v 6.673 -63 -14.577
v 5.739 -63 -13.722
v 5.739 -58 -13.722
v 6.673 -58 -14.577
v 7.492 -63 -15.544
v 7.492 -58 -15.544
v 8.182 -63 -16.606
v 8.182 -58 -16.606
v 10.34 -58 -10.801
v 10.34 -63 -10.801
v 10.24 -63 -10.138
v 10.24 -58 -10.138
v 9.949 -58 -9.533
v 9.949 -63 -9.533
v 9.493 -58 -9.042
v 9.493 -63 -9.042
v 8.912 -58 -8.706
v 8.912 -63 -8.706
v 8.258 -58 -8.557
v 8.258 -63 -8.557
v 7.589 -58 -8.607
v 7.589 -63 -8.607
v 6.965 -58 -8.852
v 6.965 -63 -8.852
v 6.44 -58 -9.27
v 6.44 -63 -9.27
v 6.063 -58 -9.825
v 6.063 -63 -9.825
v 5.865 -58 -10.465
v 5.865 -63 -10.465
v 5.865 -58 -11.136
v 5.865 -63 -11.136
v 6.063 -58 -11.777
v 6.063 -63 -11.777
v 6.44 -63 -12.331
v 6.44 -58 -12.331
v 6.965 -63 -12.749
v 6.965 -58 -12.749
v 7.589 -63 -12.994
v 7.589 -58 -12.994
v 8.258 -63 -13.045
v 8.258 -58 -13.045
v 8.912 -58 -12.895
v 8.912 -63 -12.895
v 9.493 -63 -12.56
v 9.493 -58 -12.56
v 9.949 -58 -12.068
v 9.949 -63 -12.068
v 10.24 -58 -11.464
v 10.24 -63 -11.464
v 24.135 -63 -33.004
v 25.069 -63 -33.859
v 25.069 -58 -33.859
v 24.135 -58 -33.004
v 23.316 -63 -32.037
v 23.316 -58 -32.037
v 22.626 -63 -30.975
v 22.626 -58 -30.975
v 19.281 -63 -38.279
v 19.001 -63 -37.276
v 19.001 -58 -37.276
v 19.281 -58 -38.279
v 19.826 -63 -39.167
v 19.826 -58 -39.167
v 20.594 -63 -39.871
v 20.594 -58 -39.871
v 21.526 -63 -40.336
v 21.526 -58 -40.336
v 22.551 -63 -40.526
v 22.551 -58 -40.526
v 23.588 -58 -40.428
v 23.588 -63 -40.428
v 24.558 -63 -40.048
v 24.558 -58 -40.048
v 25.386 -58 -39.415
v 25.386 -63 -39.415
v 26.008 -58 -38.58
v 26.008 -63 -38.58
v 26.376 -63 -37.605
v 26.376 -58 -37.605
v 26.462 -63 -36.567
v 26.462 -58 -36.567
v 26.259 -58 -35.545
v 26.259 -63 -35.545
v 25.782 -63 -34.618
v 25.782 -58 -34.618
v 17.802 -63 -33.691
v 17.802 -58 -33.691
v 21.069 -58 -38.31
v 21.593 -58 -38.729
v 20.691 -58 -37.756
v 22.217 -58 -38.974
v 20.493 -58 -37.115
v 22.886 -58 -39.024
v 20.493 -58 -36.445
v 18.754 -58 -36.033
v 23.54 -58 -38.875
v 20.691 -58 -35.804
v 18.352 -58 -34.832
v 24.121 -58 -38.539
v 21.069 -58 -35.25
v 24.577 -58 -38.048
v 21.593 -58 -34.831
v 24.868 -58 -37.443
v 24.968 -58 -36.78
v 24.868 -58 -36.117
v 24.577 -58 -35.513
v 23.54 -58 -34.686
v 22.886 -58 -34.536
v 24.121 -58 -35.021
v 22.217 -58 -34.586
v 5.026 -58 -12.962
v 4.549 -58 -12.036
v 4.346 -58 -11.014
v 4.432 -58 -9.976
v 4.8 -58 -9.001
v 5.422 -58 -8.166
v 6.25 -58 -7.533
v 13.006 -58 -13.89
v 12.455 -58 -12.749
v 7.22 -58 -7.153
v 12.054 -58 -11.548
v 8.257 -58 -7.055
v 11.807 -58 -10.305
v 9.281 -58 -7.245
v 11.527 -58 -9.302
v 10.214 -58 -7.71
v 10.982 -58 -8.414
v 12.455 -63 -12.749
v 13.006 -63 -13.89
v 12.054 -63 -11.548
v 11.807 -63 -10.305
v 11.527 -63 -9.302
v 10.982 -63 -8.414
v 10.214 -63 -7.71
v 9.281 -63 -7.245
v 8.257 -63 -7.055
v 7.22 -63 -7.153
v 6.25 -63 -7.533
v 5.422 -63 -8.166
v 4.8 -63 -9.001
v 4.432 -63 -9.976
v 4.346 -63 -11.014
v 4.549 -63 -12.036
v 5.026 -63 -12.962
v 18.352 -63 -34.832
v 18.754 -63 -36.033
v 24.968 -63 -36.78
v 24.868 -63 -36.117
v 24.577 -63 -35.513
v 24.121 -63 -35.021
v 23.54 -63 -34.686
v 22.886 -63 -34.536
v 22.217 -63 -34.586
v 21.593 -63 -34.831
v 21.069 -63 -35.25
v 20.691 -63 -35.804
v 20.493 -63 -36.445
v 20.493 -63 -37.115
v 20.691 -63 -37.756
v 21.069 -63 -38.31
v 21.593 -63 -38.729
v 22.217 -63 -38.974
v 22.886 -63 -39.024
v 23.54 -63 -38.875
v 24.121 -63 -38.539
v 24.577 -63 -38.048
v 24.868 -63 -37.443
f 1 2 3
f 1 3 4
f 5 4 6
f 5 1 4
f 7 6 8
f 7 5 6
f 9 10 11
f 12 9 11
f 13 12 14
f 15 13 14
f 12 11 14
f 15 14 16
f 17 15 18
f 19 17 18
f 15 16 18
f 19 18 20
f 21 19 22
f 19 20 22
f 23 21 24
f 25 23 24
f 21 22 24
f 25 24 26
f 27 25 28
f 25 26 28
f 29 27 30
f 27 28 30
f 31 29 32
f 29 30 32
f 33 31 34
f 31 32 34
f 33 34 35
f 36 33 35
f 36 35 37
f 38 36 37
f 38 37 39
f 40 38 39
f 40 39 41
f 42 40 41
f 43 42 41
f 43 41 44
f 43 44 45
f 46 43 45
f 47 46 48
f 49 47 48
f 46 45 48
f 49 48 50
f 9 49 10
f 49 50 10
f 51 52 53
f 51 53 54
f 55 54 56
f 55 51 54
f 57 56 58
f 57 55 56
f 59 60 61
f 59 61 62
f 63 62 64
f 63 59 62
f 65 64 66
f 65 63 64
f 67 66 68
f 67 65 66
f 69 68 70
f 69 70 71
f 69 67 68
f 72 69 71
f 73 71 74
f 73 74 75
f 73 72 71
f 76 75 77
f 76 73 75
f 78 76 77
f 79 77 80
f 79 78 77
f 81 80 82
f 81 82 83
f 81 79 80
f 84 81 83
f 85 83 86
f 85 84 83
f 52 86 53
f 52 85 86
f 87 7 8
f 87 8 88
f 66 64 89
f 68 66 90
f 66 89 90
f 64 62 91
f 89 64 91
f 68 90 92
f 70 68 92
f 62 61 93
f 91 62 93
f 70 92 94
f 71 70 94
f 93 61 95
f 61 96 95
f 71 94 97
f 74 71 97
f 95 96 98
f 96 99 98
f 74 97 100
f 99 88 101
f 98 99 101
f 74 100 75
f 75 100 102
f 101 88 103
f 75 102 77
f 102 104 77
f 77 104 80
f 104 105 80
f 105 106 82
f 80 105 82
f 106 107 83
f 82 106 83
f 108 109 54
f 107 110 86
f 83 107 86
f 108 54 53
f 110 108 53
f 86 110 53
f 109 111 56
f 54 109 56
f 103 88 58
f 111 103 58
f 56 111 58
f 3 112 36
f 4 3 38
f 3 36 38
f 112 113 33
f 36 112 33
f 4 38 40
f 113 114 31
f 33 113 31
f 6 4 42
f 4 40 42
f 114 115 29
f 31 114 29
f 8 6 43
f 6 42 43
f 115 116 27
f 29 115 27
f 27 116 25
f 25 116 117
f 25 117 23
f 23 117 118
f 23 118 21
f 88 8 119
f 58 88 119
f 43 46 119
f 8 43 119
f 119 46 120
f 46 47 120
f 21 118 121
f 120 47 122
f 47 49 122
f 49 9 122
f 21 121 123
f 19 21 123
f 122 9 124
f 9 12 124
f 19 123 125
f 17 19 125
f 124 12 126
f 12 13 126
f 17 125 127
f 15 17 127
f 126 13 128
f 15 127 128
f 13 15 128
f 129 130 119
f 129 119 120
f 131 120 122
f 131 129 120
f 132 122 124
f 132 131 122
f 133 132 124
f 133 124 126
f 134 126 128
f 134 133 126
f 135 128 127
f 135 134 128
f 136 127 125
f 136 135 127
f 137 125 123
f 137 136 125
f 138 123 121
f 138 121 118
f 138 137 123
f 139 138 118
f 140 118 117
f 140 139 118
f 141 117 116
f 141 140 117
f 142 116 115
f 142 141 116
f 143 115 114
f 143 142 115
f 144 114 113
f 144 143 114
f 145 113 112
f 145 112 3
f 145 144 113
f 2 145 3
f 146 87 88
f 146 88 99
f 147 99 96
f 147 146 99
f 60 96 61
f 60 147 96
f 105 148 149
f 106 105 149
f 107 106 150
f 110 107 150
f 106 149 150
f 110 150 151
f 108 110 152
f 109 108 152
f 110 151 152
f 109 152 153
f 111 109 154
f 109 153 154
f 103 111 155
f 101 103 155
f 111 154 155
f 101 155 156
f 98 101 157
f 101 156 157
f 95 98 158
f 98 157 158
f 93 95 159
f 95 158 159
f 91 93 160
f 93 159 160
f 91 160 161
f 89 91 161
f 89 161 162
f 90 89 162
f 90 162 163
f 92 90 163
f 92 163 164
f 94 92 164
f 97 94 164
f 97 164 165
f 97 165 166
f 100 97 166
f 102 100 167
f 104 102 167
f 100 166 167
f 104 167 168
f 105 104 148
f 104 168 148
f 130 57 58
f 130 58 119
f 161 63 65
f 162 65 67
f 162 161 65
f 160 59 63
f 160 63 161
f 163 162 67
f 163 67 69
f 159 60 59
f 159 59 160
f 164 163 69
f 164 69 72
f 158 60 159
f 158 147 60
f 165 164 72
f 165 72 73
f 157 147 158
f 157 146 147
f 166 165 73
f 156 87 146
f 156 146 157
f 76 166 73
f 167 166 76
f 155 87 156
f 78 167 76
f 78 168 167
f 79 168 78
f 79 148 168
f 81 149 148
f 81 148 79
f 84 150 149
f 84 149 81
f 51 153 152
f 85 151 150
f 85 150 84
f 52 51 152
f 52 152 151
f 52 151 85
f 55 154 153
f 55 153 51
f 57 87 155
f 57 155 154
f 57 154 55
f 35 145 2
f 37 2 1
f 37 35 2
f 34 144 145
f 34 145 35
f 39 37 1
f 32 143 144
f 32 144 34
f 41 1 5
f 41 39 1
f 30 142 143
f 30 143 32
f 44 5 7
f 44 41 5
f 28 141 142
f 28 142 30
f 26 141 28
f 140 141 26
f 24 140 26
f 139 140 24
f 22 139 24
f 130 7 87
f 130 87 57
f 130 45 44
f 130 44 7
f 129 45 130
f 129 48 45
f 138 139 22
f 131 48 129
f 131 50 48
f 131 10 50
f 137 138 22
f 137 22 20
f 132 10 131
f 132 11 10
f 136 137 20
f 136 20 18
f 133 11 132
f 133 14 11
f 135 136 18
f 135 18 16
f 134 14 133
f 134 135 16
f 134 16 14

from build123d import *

# Parameters (mm, degrees)
SKETCH1_R           = 2.25
BOSS_EXTRUDE1_DEPTH = 5


with BuildPart() as part:
    # Sketch1 → Boss-Extrude1 (new body)
    with BuildSketch(Plane.XZ.offset(63)):
        with BuildLine():
            Line((8.181928414, -16.605718064), (17.802171103, -33.691169181))
            ThreePointArc((17.802171103, -33.691169181), (18.572370652, -35.426303597), (19.000782012, -37.275725803))
            ThreePointArc((19.000782012, -37.275725803), (24.55776359, -40.047666423), (25.069213931, -33.85879596))
            ThreePointArc((25.069213931, -33.85879596), (23.710027, -32.533462163), (22.625796475, -30.975148024))
            Line((22.625796475, -30.975148024), (13.005553786, -13.889696907))
            ThreePointArc((13.005553786, -13.889696907), (12.235354237, -12.15456249), (11.806942877, -10.305140285))
            ThreePointArc((11.806942877, -10.305140285), (6.249961299, -7.533199664), (5.738510958, -13.722070128))
            ThreePointArc((5.738510958, -13.722070128), (7.097697889, -15.047403925), (8.181928414, -16.605718064))
        make_face()
        with Locations((22.71787829, -36.780049236)):
            Circle(SKETCH1_R, mode=Mode.SUBTRACT)
        with Locations((8.089846599, -10.800816852)):
            Circle(SKETCH1_R, mode=Mode.SUBTRACT)
    extrude(amount=-BOSS_EXTRUDE1_DEPTH)


solid = part.part
